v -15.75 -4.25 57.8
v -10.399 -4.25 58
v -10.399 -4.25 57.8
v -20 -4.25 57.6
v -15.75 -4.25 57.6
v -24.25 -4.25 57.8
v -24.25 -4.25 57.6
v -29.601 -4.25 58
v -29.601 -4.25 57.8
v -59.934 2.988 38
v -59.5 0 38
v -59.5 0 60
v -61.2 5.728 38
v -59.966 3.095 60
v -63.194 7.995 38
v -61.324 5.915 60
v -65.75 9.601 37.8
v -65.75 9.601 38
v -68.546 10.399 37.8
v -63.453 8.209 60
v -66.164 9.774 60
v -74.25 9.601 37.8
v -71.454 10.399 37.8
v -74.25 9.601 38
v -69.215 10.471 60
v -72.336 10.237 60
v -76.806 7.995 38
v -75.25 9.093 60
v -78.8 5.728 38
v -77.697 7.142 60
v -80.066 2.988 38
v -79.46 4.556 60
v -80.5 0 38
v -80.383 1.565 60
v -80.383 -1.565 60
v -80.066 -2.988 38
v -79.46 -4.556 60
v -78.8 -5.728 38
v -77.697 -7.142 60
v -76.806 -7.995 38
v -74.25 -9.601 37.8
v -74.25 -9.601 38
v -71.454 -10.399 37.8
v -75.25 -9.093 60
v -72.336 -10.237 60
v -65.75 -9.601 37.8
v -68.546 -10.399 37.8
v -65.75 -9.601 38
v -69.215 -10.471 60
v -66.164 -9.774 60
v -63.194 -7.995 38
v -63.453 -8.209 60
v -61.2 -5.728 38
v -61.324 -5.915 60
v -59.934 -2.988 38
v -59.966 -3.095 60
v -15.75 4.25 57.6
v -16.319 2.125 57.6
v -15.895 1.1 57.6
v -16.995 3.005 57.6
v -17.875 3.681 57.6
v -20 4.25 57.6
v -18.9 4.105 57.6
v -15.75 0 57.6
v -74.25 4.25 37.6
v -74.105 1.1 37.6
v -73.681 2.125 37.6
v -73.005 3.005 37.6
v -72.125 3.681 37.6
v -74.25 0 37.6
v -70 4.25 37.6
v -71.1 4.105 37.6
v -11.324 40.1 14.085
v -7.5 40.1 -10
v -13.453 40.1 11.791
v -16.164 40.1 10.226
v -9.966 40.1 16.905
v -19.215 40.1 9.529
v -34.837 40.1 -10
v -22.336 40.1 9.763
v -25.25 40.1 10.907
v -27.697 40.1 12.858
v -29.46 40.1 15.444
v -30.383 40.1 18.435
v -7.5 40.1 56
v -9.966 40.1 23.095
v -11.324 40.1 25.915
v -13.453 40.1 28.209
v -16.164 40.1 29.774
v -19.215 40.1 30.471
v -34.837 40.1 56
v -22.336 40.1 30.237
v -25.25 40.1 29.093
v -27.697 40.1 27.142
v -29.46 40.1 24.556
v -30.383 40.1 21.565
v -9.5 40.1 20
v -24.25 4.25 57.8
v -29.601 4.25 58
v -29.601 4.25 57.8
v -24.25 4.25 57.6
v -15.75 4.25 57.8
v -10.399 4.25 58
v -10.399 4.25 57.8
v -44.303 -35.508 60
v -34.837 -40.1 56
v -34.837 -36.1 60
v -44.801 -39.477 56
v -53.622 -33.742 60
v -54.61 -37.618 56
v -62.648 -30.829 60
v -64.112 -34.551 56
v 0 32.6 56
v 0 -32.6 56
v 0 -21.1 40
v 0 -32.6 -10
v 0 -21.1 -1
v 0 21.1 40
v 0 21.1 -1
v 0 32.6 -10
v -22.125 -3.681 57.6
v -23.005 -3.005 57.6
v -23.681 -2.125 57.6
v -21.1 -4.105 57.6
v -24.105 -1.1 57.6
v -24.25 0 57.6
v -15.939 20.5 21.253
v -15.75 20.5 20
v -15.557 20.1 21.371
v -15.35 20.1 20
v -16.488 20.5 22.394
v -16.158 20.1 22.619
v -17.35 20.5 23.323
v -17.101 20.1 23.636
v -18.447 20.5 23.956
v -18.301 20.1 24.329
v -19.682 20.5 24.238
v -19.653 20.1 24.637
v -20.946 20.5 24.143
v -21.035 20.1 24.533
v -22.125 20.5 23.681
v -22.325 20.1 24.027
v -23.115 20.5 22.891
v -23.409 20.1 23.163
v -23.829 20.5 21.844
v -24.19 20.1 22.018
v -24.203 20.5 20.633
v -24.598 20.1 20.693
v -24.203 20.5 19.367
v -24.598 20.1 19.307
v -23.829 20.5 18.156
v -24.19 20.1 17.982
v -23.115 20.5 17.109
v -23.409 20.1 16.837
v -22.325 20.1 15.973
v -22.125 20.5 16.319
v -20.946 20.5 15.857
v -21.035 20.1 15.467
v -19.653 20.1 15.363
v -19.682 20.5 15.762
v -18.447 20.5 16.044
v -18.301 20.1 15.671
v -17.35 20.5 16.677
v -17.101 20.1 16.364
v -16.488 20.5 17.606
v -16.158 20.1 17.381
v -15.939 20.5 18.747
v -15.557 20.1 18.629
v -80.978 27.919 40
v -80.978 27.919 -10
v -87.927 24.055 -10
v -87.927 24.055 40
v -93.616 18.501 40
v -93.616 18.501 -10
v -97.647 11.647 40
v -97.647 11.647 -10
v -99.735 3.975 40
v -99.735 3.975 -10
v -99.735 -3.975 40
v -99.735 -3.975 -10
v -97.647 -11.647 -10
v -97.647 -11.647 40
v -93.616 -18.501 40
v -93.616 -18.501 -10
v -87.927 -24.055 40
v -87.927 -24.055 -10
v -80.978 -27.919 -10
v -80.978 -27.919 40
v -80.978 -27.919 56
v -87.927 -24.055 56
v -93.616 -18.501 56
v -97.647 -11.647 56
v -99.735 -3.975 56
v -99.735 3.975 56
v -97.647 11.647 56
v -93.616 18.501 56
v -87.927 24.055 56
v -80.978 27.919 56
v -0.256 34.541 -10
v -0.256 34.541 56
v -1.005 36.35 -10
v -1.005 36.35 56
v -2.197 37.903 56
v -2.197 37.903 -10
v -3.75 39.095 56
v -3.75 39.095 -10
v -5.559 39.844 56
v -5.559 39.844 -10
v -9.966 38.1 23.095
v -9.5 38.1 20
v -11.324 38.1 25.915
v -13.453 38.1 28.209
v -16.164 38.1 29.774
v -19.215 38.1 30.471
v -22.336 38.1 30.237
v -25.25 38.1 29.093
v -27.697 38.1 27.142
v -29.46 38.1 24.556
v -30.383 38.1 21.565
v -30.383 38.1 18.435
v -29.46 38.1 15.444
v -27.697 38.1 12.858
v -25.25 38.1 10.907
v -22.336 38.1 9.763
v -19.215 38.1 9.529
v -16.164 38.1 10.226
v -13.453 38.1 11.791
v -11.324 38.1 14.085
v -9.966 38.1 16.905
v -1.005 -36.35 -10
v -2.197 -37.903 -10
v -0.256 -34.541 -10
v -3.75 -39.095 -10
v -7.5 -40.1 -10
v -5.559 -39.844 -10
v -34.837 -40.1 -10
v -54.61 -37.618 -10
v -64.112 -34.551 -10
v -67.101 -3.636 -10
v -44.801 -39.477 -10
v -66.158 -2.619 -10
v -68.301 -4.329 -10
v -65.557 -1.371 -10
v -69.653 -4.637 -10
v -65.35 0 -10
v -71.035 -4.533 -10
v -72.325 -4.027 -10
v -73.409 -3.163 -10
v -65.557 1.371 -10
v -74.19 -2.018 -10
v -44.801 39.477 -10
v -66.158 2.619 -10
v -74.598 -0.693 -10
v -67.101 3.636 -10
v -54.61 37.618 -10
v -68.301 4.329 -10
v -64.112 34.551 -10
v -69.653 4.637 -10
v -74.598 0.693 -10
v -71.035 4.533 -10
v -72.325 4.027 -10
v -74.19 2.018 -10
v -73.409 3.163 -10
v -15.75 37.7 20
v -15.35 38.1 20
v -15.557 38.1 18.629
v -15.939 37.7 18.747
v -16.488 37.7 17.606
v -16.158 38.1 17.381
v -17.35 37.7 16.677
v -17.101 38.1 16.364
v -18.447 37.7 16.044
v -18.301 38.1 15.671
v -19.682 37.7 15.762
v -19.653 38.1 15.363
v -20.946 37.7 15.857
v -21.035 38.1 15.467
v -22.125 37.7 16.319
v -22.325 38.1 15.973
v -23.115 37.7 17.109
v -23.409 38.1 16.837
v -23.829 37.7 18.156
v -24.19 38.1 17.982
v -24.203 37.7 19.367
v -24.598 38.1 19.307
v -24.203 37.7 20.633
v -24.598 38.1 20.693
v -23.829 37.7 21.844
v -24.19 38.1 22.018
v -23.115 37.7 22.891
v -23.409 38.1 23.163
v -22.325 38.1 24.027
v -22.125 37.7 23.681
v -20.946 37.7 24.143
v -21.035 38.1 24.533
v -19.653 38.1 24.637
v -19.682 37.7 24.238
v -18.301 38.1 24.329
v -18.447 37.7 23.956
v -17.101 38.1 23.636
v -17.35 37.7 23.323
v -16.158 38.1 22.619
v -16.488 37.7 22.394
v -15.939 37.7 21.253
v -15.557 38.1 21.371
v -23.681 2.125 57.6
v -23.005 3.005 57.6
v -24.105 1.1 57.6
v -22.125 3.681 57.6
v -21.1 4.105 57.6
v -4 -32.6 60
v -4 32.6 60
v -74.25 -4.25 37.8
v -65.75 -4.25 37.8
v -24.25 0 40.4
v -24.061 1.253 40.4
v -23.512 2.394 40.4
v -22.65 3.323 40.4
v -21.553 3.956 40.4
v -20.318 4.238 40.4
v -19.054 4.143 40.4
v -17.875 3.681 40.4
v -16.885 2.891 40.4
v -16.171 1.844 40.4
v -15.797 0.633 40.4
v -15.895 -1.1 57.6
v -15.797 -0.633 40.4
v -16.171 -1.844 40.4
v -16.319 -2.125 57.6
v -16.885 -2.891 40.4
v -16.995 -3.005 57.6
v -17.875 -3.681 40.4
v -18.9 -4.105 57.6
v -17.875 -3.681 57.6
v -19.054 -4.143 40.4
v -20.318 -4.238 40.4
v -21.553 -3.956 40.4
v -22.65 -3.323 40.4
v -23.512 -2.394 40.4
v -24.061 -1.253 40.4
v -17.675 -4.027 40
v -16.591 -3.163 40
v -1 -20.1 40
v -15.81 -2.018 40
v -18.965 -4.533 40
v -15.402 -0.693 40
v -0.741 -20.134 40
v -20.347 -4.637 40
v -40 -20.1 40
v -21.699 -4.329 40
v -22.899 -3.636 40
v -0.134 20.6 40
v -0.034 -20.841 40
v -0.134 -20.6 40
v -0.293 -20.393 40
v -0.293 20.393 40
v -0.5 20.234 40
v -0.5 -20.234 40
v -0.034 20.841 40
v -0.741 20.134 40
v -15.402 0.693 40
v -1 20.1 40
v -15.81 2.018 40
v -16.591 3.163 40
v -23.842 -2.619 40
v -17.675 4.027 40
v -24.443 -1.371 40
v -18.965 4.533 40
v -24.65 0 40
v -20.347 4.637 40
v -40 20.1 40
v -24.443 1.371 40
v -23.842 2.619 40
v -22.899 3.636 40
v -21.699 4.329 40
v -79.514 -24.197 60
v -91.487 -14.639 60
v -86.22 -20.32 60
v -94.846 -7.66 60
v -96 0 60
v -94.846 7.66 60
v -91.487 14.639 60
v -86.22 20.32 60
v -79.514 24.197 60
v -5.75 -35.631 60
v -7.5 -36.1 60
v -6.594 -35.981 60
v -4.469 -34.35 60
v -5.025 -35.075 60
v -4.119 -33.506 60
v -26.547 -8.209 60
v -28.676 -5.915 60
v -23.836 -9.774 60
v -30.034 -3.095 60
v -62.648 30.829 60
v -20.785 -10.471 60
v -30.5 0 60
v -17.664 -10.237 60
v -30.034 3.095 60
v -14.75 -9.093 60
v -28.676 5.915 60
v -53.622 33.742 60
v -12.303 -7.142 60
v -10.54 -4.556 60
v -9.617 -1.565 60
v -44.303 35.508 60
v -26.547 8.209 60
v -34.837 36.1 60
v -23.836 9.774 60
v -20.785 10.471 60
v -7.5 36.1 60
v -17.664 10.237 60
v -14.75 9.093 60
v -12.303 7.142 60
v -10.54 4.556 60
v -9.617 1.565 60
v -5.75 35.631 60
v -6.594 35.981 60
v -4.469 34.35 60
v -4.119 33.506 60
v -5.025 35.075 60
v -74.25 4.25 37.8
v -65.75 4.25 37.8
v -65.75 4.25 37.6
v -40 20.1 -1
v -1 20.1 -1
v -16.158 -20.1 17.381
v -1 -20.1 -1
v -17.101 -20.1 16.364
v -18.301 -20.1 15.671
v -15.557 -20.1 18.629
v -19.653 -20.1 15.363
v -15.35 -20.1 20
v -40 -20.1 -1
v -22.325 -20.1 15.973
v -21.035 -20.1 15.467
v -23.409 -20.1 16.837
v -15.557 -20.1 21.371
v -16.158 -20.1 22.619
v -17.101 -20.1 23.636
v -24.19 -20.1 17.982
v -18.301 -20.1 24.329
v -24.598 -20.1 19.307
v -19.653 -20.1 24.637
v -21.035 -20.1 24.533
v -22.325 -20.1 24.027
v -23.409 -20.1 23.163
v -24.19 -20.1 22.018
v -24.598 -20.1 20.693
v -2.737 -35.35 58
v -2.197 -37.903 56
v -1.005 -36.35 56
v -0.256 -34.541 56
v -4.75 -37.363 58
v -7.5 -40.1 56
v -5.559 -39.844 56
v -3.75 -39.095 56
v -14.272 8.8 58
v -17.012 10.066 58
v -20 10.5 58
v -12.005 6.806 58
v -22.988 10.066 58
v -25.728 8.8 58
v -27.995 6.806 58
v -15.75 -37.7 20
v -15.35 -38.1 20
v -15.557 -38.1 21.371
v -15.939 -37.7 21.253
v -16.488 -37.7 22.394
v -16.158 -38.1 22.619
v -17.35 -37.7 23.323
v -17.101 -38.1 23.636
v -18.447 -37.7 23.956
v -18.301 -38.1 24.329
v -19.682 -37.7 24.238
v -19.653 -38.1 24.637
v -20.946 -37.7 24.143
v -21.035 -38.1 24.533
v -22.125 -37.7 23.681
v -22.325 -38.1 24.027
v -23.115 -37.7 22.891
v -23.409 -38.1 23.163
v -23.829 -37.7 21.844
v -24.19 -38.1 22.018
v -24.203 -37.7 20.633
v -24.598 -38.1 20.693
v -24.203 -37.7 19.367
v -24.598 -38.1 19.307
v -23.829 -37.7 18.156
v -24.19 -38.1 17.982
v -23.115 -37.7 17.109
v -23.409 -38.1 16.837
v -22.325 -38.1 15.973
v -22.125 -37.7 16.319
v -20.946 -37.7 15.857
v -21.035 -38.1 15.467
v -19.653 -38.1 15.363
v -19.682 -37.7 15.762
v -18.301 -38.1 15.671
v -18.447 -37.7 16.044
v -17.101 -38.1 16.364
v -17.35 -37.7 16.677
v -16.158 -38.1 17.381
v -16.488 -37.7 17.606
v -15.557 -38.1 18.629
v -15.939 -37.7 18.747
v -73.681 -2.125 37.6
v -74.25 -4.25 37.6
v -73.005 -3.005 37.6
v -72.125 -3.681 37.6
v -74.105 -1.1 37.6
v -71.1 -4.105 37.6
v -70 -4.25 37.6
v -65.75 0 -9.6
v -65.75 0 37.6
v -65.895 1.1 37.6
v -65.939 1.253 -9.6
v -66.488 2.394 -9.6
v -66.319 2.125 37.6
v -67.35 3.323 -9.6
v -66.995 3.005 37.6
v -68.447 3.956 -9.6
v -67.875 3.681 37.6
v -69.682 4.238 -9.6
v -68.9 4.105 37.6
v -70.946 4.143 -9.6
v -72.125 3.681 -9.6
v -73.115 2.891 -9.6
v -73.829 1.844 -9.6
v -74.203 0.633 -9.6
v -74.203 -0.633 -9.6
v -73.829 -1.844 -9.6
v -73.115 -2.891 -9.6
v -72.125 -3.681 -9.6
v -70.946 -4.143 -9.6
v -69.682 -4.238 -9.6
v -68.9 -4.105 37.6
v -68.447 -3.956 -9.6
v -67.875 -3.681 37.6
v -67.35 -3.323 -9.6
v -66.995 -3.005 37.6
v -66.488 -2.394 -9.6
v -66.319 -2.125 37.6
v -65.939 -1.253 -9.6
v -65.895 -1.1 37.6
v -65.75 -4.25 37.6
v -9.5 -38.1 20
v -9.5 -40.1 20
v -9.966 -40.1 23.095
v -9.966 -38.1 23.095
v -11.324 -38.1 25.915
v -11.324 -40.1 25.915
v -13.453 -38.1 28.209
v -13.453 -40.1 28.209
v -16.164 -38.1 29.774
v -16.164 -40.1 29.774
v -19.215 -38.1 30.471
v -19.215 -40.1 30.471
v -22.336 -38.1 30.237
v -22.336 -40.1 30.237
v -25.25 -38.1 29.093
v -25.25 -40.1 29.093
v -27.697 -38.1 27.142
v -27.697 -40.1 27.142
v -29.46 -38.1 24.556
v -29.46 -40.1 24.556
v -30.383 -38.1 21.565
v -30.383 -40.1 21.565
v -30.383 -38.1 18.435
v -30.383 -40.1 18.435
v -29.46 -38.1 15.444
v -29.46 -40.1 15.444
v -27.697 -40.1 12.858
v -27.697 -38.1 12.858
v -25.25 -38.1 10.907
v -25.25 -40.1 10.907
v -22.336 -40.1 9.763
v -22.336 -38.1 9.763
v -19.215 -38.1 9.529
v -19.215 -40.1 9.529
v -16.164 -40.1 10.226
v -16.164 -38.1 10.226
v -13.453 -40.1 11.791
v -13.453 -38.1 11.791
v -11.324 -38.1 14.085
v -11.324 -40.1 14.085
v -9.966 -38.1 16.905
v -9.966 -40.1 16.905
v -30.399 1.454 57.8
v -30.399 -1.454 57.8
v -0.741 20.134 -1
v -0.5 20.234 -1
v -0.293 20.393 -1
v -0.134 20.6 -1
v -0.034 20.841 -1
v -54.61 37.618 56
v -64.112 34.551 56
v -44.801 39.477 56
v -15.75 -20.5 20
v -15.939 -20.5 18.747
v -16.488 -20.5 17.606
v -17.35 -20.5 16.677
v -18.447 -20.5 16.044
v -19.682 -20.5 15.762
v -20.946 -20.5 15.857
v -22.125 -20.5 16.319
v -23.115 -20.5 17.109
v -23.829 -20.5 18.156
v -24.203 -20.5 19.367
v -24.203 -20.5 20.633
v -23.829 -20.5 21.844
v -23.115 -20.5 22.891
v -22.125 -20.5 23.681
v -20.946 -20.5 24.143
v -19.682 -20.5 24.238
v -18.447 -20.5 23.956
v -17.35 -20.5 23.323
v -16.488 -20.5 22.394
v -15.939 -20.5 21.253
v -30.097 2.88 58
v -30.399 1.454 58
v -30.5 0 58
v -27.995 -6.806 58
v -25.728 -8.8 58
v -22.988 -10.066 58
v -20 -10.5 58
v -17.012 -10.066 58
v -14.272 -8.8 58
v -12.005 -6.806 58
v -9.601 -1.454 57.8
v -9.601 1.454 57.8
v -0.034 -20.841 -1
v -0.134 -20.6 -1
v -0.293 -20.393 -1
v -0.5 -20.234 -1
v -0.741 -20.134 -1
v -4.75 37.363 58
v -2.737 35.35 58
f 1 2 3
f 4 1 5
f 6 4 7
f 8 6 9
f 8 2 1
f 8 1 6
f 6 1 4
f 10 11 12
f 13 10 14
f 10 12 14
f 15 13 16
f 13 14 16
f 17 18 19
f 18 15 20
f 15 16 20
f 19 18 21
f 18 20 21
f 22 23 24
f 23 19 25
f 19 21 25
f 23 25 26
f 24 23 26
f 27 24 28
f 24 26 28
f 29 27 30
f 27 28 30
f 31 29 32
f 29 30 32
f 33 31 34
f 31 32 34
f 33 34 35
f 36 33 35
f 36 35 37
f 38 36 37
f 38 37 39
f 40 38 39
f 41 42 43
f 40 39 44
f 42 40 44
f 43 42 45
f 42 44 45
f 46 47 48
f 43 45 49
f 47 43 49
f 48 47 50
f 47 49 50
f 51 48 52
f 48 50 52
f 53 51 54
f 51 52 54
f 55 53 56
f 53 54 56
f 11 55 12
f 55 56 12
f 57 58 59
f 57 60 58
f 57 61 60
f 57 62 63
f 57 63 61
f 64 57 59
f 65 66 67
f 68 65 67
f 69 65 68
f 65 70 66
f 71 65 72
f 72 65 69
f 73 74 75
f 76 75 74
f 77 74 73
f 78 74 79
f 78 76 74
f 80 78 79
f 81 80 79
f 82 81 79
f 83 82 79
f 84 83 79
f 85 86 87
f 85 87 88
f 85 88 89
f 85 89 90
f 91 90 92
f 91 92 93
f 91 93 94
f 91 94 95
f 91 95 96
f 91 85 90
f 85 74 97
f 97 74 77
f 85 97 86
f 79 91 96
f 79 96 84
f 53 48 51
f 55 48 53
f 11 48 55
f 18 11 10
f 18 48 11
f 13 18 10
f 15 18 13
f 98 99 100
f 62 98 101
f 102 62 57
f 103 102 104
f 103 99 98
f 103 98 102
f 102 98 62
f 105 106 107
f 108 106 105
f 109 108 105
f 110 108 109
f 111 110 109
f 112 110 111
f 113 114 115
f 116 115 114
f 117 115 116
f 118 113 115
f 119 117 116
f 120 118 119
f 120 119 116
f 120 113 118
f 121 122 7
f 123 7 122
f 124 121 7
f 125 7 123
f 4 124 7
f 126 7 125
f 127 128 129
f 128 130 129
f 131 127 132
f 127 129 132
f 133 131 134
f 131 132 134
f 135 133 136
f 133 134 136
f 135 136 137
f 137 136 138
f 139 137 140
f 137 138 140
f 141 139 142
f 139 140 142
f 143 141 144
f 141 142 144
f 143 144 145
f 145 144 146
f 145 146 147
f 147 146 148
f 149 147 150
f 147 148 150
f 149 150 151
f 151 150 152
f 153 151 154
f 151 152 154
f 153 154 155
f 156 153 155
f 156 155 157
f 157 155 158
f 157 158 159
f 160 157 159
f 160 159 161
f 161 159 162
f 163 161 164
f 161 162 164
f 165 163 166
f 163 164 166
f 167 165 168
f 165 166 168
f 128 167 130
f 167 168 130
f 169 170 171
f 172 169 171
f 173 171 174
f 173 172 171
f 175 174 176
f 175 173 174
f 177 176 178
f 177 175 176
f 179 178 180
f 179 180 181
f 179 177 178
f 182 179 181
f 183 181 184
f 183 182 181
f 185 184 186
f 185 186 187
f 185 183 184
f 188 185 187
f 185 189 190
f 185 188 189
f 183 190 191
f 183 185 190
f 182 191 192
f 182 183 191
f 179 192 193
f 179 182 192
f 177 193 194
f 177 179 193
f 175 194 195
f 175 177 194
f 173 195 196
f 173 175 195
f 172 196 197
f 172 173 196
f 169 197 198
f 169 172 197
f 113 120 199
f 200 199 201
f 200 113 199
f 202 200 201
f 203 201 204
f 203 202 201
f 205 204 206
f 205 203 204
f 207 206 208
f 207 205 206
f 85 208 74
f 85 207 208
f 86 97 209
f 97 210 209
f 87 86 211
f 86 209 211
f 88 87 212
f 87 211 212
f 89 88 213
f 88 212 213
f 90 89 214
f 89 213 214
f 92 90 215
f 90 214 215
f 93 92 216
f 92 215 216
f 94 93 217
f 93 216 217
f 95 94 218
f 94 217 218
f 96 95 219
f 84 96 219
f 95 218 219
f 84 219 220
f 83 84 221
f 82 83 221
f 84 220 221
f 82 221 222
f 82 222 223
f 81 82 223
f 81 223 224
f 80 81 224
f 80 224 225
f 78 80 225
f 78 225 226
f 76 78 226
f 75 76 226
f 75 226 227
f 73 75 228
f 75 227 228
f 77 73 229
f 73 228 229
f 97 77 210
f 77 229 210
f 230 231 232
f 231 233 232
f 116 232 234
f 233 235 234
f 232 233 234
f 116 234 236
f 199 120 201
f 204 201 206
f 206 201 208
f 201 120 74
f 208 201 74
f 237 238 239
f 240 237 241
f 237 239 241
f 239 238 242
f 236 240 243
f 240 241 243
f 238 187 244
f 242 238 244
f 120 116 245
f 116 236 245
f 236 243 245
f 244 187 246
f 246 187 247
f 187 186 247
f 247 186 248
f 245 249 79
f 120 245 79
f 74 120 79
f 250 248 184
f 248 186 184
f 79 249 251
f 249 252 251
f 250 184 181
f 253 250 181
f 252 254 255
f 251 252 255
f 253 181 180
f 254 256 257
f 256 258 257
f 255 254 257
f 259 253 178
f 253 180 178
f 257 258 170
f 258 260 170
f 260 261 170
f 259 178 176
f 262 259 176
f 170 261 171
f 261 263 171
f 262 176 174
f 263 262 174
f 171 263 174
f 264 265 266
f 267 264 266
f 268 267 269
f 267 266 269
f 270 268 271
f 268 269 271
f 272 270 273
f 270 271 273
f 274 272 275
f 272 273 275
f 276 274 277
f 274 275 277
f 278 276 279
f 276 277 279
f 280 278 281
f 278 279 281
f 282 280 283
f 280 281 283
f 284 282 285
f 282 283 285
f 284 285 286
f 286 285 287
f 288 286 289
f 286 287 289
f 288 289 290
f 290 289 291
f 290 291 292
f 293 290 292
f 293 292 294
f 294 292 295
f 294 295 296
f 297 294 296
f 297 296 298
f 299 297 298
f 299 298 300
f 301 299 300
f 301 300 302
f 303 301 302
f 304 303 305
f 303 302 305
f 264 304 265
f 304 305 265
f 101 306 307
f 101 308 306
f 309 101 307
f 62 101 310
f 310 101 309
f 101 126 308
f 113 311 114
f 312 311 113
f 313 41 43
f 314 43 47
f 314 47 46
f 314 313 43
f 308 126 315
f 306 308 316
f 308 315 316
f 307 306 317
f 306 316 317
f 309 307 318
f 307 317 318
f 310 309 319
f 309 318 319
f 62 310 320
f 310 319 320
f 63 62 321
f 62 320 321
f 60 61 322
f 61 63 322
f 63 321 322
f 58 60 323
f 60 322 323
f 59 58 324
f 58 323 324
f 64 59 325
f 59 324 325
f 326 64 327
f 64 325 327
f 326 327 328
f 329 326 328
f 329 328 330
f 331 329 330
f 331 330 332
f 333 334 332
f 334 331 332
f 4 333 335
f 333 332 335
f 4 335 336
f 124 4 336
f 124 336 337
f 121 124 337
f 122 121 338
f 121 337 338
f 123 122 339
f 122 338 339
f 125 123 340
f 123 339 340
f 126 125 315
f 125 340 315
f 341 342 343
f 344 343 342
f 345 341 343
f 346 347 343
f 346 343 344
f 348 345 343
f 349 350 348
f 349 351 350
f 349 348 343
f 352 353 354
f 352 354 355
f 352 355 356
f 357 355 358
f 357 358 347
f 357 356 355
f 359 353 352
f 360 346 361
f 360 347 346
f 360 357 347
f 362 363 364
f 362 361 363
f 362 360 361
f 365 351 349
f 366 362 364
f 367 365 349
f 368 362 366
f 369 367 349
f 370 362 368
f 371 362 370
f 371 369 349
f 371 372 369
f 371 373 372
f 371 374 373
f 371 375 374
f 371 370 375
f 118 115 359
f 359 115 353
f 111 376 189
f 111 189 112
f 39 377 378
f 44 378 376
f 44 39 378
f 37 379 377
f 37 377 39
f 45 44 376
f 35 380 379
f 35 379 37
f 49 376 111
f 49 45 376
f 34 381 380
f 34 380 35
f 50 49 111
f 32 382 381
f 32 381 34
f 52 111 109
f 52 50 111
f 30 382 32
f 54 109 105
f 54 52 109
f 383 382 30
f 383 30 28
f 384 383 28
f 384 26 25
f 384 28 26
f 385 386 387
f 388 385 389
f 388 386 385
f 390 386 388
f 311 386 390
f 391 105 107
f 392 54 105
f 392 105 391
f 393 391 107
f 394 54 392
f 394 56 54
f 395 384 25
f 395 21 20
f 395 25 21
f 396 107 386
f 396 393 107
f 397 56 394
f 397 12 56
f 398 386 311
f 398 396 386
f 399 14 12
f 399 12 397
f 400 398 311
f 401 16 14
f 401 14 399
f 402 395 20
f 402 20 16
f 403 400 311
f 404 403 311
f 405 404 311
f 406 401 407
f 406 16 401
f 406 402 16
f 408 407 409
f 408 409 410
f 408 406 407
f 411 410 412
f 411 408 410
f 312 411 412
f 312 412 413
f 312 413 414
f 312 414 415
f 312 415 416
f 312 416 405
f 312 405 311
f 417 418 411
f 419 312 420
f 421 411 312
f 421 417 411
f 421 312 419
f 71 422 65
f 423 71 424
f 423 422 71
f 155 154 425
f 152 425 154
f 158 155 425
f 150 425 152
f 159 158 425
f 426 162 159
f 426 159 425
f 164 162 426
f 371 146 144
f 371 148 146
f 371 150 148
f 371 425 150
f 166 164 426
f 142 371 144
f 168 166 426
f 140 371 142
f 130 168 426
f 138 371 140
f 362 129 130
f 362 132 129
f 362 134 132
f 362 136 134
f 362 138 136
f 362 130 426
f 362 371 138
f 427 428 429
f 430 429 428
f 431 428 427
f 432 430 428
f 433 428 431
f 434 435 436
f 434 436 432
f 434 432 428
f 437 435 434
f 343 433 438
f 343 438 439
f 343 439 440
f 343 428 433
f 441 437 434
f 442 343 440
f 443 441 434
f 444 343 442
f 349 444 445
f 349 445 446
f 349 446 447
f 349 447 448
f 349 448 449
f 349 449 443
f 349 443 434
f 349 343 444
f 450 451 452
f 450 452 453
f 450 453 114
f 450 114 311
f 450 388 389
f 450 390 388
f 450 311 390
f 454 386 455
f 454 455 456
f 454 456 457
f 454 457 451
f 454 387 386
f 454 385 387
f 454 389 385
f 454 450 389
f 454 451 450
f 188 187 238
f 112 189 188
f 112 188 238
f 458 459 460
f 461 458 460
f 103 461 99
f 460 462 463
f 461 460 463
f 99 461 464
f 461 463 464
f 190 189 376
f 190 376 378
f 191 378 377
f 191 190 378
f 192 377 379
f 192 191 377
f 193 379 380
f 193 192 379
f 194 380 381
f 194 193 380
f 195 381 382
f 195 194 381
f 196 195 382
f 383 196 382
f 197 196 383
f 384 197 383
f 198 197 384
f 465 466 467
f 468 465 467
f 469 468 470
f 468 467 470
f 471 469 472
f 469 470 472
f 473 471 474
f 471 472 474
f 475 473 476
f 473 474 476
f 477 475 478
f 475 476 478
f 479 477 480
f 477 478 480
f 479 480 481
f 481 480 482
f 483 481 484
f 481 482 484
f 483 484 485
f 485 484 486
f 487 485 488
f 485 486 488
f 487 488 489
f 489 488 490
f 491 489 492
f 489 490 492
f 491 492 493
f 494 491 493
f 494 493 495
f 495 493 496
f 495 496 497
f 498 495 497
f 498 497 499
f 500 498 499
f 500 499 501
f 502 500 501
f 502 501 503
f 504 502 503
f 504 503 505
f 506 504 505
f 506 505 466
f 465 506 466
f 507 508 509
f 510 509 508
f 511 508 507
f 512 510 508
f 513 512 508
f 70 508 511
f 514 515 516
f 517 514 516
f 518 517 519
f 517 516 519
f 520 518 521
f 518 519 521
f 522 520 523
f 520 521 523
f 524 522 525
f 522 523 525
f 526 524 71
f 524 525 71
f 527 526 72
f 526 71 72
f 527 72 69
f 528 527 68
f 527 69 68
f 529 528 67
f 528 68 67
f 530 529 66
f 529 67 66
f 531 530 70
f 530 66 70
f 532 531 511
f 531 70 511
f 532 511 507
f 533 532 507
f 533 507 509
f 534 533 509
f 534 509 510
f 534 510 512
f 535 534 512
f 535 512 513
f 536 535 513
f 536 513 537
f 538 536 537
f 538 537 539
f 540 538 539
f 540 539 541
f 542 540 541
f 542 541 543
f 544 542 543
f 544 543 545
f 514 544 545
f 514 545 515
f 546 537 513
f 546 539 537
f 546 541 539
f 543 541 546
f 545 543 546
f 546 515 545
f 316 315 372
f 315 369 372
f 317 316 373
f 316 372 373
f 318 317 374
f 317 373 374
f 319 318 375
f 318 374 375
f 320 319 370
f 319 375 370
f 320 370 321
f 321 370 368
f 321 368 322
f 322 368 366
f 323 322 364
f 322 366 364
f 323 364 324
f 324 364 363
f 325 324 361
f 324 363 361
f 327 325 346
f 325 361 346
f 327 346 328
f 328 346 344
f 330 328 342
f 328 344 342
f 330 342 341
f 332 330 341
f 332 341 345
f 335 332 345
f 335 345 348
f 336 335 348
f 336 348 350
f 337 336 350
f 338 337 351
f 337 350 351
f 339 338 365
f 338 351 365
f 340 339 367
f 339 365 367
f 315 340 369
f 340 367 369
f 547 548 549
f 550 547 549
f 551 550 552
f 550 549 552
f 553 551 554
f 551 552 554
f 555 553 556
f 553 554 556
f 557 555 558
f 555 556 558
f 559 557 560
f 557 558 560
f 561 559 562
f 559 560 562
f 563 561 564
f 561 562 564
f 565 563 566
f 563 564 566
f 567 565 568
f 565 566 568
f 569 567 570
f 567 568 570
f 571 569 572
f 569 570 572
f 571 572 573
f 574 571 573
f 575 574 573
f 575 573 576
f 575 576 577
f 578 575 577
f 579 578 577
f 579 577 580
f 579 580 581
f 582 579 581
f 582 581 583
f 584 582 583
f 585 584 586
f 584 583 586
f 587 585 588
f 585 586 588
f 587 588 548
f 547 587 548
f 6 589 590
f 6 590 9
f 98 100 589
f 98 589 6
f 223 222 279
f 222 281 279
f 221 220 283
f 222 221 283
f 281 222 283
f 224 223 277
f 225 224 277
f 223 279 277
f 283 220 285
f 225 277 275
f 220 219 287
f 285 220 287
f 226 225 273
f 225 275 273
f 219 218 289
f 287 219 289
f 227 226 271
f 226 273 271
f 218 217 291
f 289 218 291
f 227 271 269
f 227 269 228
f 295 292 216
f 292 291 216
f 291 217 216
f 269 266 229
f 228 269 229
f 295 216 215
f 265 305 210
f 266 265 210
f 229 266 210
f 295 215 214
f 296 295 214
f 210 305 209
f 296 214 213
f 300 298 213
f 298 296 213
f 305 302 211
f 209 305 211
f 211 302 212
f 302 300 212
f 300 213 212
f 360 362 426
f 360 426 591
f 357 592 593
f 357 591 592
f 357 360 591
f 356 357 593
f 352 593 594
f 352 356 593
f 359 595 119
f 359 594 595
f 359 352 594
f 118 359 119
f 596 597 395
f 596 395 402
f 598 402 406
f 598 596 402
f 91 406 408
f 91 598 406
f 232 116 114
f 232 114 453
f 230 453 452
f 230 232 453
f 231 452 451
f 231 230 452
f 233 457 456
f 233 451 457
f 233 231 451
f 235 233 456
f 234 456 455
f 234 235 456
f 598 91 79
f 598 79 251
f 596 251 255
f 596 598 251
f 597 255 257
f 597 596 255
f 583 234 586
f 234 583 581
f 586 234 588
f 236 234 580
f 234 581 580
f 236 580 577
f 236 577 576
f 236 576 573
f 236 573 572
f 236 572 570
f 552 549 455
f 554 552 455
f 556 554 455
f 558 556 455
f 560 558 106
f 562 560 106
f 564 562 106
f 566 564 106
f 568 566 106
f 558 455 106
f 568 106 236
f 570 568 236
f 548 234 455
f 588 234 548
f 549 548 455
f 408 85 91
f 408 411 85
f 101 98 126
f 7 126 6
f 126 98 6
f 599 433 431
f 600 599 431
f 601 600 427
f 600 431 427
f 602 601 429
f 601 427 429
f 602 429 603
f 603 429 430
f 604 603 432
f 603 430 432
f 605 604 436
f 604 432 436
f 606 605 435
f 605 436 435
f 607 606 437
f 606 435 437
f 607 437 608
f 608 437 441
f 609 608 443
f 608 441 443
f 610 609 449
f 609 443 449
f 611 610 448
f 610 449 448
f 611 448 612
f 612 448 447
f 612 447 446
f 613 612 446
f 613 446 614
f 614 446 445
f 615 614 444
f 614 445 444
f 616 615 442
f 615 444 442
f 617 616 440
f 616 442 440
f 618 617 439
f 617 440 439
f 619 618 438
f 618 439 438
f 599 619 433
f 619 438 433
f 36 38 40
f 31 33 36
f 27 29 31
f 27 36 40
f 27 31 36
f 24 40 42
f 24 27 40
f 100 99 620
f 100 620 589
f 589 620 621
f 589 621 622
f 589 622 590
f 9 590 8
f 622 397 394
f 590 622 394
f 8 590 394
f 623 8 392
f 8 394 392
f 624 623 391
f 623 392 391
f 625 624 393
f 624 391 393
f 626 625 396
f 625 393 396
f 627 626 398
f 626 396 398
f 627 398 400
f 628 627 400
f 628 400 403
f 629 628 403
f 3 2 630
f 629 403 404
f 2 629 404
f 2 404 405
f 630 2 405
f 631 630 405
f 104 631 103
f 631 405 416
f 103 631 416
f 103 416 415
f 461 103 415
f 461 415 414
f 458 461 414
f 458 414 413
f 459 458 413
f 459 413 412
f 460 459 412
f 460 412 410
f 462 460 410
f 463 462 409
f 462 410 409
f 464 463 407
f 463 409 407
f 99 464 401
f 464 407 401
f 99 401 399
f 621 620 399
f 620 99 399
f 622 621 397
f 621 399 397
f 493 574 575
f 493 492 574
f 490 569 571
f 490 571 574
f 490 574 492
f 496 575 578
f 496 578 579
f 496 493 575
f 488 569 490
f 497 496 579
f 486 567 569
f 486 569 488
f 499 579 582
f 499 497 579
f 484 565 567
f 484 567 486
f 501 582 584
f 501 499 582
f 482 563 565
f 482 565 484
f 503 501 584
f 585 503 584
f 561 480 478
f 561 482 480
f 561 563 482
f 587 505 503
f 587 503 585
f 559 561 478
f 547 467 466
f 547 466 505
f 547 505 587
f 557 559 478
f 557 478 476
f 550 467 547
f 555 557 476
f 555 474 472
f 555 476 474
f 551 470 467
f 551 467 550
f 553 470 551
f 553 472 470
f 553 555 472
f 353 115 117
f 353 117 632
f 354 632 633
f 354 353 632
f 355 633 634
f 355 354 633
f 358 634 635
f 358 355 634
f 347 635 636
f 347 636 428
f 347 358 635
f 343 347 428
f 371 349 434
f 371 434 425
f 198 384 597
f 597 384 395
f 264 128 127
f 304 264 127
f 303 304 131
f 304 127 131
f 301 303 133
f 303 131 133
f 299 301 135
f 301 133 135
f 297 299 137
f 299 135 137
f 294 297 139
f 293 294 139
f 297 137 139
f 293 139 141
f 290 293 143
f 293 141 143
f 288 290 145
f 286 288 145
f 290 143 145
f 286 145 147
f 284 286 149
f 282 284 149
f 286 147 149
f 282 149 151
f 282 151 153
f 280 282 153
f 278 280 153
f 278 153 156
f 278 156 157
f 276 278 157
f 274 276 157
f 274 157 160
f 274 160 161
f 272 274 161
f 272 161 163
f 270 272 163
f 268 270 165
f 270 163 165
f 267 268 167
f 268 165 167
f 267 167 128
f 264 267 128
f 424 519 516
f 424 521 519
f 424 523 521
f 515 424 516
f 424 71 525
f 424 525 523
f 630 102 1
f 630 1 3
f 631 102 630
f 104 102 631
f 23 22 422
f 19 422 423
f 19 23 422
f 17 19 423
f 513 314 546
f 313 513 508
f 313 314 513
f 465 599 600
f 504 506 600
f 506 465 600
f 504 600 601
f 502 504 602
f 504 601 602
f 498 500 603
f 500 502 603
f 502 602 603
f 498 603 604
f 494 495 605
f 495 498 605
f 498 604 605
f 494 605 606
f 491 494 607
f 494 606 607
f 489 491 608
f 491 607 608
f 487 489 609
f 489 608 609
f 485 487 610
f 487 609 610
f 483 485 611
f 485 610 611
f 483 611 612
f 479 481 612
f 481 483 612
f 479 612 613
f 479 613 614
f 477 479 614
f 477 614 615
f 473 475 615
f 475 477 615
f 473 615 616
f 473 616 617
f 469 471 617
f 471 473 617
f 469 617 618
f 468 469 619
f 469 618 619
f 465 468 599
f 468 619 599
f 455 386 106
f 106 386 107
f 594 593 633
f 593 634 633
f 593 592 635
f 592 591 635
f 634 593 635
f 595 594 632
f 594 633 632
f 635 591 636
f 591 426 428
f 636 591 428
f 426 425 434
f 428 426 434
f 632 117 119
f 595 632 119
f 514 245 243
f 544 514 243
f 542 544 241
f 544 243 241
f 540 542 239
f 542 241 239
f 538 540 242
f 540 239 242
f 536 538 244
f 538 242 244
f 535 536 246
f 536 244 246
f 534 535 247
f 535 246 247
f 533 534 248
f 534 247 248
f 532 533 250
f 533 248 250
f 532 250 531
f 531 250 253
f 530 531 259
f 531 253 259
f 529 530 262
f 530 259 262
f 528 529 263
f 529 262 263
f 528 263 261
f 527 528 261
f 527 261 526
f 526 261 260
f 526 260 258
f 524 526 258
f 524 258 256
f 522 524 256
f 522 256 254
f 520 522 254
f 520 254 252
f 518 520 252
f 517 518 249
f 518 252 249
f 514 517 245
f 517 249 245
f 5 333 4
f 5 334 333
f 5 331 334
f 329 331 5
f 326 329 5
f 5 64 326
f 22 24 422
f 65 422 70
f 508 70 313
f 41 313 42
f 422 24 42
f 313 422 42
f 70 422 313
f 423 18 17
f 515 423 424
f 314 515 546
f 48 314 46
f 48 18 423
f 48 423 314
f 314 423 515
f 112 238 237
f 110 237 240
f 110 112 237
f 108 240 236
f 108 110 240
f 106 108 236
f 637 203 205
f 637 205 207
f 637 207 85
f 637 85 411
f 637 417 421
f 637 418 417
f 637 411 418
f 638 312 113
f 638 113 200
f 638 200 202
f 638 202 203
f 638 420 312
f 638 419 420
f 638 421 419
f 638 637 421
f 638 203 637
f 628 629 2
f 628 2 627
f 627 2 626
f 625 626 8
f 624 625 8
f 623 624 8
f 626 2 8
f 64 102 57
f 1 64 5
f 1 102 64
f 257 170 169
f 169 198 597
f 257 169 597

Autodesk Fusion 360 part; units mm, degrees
sketch "Sketch1" plane through (0, 0, 0) normal (0, 0, 1) x (1, 0, 0)
  line L0 (-40, 20.1) -> (40, 20.1)
  line L1 (40, 20.1) -> (40, -20.1)
  line L2 (40, -20.1) -> (-40, -20.1)
  line L3 (-40, -20.1) -> (-40, 20.1)
  line L4 (-40, 20.1) -> (40, -20.1) construction
  line L5 (40, 20.1) -> (-40, -20.1) construction
  line L6 (0, 20.1) -> (0, 40.1)
  line L7 (0, 40.1) -> (-50, 40.1)
  line L8 (0, -20.1) -> (0, -40.1)
  line L9 (0, -40.1) -> (-50, -40.1)
  line L10 (-40, 0) -> (-70, 0) construction
  circle A0 centre (-70, 0) radius 10.5
  circle A1 centre (-70, 0) radius 30
  line L11 (-80.978, 27.9192) -> (-50, 40.1)
  line L12 (-80.978, -27.9192) -> (-50, -40.1)
  circle A2 centre (-70, 0) radius 4.25
  dimension "d1" = 80
  dimension "d2" = 40.2
  dimension "d3" = 20
  dimension "d4" = 20
  dimension "d5" = 30
  dimension "d6" = 21
  dimension "d7" = 8.5
  dimension "d8" = 10
  dimension "d9" = 10
extrude "Extrude1" add sketch "Sketch1" along normal blind 40 contours L0 L3 L6 L7 A1 L11 | A1 | L2 L3 L8 L9 A1 L12 | A0 makes body 1
sketch "Sketch2" plane through (0, 0, 40) normal (0, 0, 1) x (1, 0, 0)
  circle A0 centre (-70, 0) radius 4.25
  arc A1 (-80.978, 27.9192) -> (-80.978, -27.9192) centre (-70, 0) ccw
  line L0 (-80.978, -27.9192) -> (-50, -40.1)
  line L1 (-50, -40.1) -> (0, -40.1)
  line L2 (0, -40.1) -> (0, -20.1)
  line L3 (0, -20.1) -> (-40, -20.1)
  line L4 (-40, -20.1) -> (-40, 20.1)
  line L5 (-40, 20.1) -> (0, 20.1)
  line L6 (0, 20.1) -> (0, 40.1)
  line L7 (0, 40.1) -> (-50, 40.1)
  line L8 (-50, 40.1) -> (-80.978, 27.9192)
  line L9 (0, 20.1) -> (0, -20.1)
extrude "Extrude2" add sketch "Sketch2" along normal blind 20 bodies 1
sketch "Sketch3" plane through (0, 0, 40) normal (0, 0, -1) x (-1, 0, 0)
  line L0 (40, 20.1) -> (0, 20.1)
  line L1 (0, 20.1) -> (0, -20.1)
  line L2 (0, -20.1) -> (40, -20.1)
  line L3 (40, -20.1) -> (40, 20.1)
  line L4 (20, 20.1) -> (20, -20.1) construction
  circle A0 centre (20, 0) radius 10.5
  circle A1 centre (20, 0) radius 4.25
  dimension "d63" = 21
  dimension "d64" = 8.5
extrude "Extrude16" cut sketch "Sketch3" against normal blind 38 contours A0 | A1 bodies 1
extrude "Extrude17" add sketch "Sketch3" against normal blind 18 contours A0 bodies 1
sketch "Sketch11" plane through (0, 0, 58) normal (0, 0, 1) x (1, 0, 0)
  circle A0 centre (-20, 0) radius 4.25
  circle A1 centre (-20, 0) radius 10.5
  line L0 (-29.6014, 4.25) -> (-10.3986, 4.25)
  line L1 (-10.3986, -4.25) -> (-29.6014, -4.25)
  line L2 (-15.75, 4.25) -> (-15.75, -4.25)
  line L3 (-24.25, 4.25) -> (-24.25, -4.25)
extrude "Extrude18" cut sketch "Sketch11" against normal blind 0.2 contours A0 L1 L2 | A0 L0 L2 | A1 L0 L1 L2 | A0 L0 L3 | A0 L1 L3 | A1 L0 L1 L3 bodies 1
extrude "Extrude19" cut sketch "Sketch11" against normal blind 0.4 contours A0 L1 L2 | A0 L0 L2 | A0 L0 L3 | A0 L1 L3 bodies 1
sketch "Sketch5" plane through (0, 0, 60) normal (0, 0, 1) x (1, 0, 0)
  circle A0 centre (-70, 0) radius 4.25
  line L0 (0, 40.1) -> (-50, 40.1)
  line L1 (-50, 40.1) -> (-80.978, 27.9192)
  arc A1 (-80.978, 27.9192) -> (-80.978, -27.9192) centre (-70, 0) ccw
  line L2 (-80.978, -27.9192) -> (-50, -40.1)
  line L3 (-50, -40.1) -> (0, -40.1)
  line L4 (0, -40.1) -> (0, 40.1)
  circle A2 centre (-70, 0) radius 10.5
  circle A3 centre (-20, 0) radius 10.5
  dimension "d24" = 21
extrude "Extrude5" cut sketch "Sketch5" against normal blind 22 contours A2 bodies 1
sketch "Sketch8" plane through (0, 20.1, 0) normal (0, -1, 0) x (1, 0, 0)
  line L0 (-40, 0) -> (0, 0)
  line L1 (0, 0) -> (0, 40)
  line L2 (0, 40) -> (-40, 40)
  line L3 (-40, 40) -> (-40, 0)
  line L4 (-40, 40) -> (0, 0) construction
  circle A0 centre (-20, 20) radius 4.25
  circle A1 centre (-20, 20) radius 10.5
  dimension "d42" = 8.5
  dimension "d43" = 21
extrude "Extrude9" cut sketch "Sketch8" along normal blind -43 and the other way blind -83 contours A0 | A1 bodies 1
extrude "Extrude10" add sketch "Sketch8" against normal blind 18 contours A1 bodies 1
extrude "Extrude11" add sketch "Sketch8" along normal blind 18 from surface at 40.2 contours A1 bodies 1
sketch "Sketch10" plane through (0, 0, 38) normal (0, 0, 1) x (1, 0, 0)
  circle A0 centre (-70, 0) radius 4.25
  circle A1 centre (-70, 0) radius 10.5
  line L0 (-74.25, 9.6014) -> (-74.25, -9.6014)
  line L1 (-65.75, 9.6014) -> (-65.75, -9.6014)
  line L2 (-74.25, 4.25) -> (-65.75, 4.25)
  line L3 (-65.75, -4.25) -> (-74.25, -4.25)
extrude "Extrude14" cut sketch "Sketch10" against normal blind 0.2 contours A0 L1 L3 | A0 L1 L2 | A0 L0 L2 | A1 L0 L1 L2 | A0 L0 L3 | A1 L0 L1 L3 bodies 1
extrude "Extrude15" cut sketch "Sketch10" against normal blind 0.4 contours A0 L1 L3 | A0 L1 L2 | A0 L0 L2 | A0 L0 L3 bodies 1
extrude "Extrude20" add 1 faces at (-48.5833, 0, 0) along direction (0, 0, -1) blind 10 on bodies 1 bodies 1
sketch "Sketch12" plane through (-40, 0, 0) normal (1, 0, 0) x (0, 0, -1)
  line L0 (10, 20.1) -> (-40, 20.1)
  line L1 (-40, 20.1) -> (-40, -20.1)
  line L2 (-40, -20.1) -> (10, -20.1)
  line L3 (10, -20.1) -> (10, 20.1)
  line L4 (1, 20.1) -> (1, -20.1)
  dimension "d85" = 41
extrude "Extrude21" add sketch "Sketch12" along normal blind 40 contours L0 L2 L3 L4 bodies 1
fillet "Fillet2" radius 80 2 edges at (-50, 40.1, 30) (-50, -40.1, 30) on bodies 1
fillet "Fillet2" radius 7.5 2 edges at (0, 40.1, 30) (0, -40.1, 30) on bodies 1
chamfer "Chamfer1" distance 4 distance2 4 10 edges at (-49.7348, 38.7006, 60) (-21.1684, 40.1, 60) (-2.1967, 37.9033, 60) (0, 0, 60) (-2.1967, -37.9033, 60) (-21.1684, -40.1, 60) (-49.7348, -38.7006, 60) (-72.5448, -31.2352, 60) (-100, 0, 60) (-72.5448, 31.2352, 60) measured on face at (-51.3673, 38.3735, 36.6667) measured on face at (-44.9337, 17.1022, 60) measured on face at (-7.1431, 40.0915, 36.6667) measured on face at (-44.9337, 17.1022, 60) measured on face at (-7.1431, -40.0915, 13.3333) measured on face at (-44.9337, 17.1022, 60) measured on face at (-38.1659, -40.0307, 13.3333) measured on face at (-44.9337, 17.1022, 60) measured on face at (-44.9337, 17.1022, 60) measured on face at (-44.9337, 17.1022, 60) on bodies 1
chamfer "Chamfer1" distance 0.4 distance2 0.4 2 edges at (-16.0376, 1.5369, 40) (-73.9624, -1.5369, -10) 2 faces at (-15.7553, -32.1, 19.7882) (-15.7553, 32.1, 19.7882) measured on face at (-20.1059, -14.8127, 40) measured on face at (-21.9167, 0, -10) on bodies 1
fillet "Fillet3" radius 1 2 edges at (0, -20.1, 20) (0, 20.1, 20) on bodies 1
copy_body "Body->Comp1" bodies 1 removing the originals makes body 2 in component "side brace upper mount"
component "side brace upper mount" placed x (1, 0, 0) y (0, 1, 0) z (0, 0, 1) at (0, 0, 0)
